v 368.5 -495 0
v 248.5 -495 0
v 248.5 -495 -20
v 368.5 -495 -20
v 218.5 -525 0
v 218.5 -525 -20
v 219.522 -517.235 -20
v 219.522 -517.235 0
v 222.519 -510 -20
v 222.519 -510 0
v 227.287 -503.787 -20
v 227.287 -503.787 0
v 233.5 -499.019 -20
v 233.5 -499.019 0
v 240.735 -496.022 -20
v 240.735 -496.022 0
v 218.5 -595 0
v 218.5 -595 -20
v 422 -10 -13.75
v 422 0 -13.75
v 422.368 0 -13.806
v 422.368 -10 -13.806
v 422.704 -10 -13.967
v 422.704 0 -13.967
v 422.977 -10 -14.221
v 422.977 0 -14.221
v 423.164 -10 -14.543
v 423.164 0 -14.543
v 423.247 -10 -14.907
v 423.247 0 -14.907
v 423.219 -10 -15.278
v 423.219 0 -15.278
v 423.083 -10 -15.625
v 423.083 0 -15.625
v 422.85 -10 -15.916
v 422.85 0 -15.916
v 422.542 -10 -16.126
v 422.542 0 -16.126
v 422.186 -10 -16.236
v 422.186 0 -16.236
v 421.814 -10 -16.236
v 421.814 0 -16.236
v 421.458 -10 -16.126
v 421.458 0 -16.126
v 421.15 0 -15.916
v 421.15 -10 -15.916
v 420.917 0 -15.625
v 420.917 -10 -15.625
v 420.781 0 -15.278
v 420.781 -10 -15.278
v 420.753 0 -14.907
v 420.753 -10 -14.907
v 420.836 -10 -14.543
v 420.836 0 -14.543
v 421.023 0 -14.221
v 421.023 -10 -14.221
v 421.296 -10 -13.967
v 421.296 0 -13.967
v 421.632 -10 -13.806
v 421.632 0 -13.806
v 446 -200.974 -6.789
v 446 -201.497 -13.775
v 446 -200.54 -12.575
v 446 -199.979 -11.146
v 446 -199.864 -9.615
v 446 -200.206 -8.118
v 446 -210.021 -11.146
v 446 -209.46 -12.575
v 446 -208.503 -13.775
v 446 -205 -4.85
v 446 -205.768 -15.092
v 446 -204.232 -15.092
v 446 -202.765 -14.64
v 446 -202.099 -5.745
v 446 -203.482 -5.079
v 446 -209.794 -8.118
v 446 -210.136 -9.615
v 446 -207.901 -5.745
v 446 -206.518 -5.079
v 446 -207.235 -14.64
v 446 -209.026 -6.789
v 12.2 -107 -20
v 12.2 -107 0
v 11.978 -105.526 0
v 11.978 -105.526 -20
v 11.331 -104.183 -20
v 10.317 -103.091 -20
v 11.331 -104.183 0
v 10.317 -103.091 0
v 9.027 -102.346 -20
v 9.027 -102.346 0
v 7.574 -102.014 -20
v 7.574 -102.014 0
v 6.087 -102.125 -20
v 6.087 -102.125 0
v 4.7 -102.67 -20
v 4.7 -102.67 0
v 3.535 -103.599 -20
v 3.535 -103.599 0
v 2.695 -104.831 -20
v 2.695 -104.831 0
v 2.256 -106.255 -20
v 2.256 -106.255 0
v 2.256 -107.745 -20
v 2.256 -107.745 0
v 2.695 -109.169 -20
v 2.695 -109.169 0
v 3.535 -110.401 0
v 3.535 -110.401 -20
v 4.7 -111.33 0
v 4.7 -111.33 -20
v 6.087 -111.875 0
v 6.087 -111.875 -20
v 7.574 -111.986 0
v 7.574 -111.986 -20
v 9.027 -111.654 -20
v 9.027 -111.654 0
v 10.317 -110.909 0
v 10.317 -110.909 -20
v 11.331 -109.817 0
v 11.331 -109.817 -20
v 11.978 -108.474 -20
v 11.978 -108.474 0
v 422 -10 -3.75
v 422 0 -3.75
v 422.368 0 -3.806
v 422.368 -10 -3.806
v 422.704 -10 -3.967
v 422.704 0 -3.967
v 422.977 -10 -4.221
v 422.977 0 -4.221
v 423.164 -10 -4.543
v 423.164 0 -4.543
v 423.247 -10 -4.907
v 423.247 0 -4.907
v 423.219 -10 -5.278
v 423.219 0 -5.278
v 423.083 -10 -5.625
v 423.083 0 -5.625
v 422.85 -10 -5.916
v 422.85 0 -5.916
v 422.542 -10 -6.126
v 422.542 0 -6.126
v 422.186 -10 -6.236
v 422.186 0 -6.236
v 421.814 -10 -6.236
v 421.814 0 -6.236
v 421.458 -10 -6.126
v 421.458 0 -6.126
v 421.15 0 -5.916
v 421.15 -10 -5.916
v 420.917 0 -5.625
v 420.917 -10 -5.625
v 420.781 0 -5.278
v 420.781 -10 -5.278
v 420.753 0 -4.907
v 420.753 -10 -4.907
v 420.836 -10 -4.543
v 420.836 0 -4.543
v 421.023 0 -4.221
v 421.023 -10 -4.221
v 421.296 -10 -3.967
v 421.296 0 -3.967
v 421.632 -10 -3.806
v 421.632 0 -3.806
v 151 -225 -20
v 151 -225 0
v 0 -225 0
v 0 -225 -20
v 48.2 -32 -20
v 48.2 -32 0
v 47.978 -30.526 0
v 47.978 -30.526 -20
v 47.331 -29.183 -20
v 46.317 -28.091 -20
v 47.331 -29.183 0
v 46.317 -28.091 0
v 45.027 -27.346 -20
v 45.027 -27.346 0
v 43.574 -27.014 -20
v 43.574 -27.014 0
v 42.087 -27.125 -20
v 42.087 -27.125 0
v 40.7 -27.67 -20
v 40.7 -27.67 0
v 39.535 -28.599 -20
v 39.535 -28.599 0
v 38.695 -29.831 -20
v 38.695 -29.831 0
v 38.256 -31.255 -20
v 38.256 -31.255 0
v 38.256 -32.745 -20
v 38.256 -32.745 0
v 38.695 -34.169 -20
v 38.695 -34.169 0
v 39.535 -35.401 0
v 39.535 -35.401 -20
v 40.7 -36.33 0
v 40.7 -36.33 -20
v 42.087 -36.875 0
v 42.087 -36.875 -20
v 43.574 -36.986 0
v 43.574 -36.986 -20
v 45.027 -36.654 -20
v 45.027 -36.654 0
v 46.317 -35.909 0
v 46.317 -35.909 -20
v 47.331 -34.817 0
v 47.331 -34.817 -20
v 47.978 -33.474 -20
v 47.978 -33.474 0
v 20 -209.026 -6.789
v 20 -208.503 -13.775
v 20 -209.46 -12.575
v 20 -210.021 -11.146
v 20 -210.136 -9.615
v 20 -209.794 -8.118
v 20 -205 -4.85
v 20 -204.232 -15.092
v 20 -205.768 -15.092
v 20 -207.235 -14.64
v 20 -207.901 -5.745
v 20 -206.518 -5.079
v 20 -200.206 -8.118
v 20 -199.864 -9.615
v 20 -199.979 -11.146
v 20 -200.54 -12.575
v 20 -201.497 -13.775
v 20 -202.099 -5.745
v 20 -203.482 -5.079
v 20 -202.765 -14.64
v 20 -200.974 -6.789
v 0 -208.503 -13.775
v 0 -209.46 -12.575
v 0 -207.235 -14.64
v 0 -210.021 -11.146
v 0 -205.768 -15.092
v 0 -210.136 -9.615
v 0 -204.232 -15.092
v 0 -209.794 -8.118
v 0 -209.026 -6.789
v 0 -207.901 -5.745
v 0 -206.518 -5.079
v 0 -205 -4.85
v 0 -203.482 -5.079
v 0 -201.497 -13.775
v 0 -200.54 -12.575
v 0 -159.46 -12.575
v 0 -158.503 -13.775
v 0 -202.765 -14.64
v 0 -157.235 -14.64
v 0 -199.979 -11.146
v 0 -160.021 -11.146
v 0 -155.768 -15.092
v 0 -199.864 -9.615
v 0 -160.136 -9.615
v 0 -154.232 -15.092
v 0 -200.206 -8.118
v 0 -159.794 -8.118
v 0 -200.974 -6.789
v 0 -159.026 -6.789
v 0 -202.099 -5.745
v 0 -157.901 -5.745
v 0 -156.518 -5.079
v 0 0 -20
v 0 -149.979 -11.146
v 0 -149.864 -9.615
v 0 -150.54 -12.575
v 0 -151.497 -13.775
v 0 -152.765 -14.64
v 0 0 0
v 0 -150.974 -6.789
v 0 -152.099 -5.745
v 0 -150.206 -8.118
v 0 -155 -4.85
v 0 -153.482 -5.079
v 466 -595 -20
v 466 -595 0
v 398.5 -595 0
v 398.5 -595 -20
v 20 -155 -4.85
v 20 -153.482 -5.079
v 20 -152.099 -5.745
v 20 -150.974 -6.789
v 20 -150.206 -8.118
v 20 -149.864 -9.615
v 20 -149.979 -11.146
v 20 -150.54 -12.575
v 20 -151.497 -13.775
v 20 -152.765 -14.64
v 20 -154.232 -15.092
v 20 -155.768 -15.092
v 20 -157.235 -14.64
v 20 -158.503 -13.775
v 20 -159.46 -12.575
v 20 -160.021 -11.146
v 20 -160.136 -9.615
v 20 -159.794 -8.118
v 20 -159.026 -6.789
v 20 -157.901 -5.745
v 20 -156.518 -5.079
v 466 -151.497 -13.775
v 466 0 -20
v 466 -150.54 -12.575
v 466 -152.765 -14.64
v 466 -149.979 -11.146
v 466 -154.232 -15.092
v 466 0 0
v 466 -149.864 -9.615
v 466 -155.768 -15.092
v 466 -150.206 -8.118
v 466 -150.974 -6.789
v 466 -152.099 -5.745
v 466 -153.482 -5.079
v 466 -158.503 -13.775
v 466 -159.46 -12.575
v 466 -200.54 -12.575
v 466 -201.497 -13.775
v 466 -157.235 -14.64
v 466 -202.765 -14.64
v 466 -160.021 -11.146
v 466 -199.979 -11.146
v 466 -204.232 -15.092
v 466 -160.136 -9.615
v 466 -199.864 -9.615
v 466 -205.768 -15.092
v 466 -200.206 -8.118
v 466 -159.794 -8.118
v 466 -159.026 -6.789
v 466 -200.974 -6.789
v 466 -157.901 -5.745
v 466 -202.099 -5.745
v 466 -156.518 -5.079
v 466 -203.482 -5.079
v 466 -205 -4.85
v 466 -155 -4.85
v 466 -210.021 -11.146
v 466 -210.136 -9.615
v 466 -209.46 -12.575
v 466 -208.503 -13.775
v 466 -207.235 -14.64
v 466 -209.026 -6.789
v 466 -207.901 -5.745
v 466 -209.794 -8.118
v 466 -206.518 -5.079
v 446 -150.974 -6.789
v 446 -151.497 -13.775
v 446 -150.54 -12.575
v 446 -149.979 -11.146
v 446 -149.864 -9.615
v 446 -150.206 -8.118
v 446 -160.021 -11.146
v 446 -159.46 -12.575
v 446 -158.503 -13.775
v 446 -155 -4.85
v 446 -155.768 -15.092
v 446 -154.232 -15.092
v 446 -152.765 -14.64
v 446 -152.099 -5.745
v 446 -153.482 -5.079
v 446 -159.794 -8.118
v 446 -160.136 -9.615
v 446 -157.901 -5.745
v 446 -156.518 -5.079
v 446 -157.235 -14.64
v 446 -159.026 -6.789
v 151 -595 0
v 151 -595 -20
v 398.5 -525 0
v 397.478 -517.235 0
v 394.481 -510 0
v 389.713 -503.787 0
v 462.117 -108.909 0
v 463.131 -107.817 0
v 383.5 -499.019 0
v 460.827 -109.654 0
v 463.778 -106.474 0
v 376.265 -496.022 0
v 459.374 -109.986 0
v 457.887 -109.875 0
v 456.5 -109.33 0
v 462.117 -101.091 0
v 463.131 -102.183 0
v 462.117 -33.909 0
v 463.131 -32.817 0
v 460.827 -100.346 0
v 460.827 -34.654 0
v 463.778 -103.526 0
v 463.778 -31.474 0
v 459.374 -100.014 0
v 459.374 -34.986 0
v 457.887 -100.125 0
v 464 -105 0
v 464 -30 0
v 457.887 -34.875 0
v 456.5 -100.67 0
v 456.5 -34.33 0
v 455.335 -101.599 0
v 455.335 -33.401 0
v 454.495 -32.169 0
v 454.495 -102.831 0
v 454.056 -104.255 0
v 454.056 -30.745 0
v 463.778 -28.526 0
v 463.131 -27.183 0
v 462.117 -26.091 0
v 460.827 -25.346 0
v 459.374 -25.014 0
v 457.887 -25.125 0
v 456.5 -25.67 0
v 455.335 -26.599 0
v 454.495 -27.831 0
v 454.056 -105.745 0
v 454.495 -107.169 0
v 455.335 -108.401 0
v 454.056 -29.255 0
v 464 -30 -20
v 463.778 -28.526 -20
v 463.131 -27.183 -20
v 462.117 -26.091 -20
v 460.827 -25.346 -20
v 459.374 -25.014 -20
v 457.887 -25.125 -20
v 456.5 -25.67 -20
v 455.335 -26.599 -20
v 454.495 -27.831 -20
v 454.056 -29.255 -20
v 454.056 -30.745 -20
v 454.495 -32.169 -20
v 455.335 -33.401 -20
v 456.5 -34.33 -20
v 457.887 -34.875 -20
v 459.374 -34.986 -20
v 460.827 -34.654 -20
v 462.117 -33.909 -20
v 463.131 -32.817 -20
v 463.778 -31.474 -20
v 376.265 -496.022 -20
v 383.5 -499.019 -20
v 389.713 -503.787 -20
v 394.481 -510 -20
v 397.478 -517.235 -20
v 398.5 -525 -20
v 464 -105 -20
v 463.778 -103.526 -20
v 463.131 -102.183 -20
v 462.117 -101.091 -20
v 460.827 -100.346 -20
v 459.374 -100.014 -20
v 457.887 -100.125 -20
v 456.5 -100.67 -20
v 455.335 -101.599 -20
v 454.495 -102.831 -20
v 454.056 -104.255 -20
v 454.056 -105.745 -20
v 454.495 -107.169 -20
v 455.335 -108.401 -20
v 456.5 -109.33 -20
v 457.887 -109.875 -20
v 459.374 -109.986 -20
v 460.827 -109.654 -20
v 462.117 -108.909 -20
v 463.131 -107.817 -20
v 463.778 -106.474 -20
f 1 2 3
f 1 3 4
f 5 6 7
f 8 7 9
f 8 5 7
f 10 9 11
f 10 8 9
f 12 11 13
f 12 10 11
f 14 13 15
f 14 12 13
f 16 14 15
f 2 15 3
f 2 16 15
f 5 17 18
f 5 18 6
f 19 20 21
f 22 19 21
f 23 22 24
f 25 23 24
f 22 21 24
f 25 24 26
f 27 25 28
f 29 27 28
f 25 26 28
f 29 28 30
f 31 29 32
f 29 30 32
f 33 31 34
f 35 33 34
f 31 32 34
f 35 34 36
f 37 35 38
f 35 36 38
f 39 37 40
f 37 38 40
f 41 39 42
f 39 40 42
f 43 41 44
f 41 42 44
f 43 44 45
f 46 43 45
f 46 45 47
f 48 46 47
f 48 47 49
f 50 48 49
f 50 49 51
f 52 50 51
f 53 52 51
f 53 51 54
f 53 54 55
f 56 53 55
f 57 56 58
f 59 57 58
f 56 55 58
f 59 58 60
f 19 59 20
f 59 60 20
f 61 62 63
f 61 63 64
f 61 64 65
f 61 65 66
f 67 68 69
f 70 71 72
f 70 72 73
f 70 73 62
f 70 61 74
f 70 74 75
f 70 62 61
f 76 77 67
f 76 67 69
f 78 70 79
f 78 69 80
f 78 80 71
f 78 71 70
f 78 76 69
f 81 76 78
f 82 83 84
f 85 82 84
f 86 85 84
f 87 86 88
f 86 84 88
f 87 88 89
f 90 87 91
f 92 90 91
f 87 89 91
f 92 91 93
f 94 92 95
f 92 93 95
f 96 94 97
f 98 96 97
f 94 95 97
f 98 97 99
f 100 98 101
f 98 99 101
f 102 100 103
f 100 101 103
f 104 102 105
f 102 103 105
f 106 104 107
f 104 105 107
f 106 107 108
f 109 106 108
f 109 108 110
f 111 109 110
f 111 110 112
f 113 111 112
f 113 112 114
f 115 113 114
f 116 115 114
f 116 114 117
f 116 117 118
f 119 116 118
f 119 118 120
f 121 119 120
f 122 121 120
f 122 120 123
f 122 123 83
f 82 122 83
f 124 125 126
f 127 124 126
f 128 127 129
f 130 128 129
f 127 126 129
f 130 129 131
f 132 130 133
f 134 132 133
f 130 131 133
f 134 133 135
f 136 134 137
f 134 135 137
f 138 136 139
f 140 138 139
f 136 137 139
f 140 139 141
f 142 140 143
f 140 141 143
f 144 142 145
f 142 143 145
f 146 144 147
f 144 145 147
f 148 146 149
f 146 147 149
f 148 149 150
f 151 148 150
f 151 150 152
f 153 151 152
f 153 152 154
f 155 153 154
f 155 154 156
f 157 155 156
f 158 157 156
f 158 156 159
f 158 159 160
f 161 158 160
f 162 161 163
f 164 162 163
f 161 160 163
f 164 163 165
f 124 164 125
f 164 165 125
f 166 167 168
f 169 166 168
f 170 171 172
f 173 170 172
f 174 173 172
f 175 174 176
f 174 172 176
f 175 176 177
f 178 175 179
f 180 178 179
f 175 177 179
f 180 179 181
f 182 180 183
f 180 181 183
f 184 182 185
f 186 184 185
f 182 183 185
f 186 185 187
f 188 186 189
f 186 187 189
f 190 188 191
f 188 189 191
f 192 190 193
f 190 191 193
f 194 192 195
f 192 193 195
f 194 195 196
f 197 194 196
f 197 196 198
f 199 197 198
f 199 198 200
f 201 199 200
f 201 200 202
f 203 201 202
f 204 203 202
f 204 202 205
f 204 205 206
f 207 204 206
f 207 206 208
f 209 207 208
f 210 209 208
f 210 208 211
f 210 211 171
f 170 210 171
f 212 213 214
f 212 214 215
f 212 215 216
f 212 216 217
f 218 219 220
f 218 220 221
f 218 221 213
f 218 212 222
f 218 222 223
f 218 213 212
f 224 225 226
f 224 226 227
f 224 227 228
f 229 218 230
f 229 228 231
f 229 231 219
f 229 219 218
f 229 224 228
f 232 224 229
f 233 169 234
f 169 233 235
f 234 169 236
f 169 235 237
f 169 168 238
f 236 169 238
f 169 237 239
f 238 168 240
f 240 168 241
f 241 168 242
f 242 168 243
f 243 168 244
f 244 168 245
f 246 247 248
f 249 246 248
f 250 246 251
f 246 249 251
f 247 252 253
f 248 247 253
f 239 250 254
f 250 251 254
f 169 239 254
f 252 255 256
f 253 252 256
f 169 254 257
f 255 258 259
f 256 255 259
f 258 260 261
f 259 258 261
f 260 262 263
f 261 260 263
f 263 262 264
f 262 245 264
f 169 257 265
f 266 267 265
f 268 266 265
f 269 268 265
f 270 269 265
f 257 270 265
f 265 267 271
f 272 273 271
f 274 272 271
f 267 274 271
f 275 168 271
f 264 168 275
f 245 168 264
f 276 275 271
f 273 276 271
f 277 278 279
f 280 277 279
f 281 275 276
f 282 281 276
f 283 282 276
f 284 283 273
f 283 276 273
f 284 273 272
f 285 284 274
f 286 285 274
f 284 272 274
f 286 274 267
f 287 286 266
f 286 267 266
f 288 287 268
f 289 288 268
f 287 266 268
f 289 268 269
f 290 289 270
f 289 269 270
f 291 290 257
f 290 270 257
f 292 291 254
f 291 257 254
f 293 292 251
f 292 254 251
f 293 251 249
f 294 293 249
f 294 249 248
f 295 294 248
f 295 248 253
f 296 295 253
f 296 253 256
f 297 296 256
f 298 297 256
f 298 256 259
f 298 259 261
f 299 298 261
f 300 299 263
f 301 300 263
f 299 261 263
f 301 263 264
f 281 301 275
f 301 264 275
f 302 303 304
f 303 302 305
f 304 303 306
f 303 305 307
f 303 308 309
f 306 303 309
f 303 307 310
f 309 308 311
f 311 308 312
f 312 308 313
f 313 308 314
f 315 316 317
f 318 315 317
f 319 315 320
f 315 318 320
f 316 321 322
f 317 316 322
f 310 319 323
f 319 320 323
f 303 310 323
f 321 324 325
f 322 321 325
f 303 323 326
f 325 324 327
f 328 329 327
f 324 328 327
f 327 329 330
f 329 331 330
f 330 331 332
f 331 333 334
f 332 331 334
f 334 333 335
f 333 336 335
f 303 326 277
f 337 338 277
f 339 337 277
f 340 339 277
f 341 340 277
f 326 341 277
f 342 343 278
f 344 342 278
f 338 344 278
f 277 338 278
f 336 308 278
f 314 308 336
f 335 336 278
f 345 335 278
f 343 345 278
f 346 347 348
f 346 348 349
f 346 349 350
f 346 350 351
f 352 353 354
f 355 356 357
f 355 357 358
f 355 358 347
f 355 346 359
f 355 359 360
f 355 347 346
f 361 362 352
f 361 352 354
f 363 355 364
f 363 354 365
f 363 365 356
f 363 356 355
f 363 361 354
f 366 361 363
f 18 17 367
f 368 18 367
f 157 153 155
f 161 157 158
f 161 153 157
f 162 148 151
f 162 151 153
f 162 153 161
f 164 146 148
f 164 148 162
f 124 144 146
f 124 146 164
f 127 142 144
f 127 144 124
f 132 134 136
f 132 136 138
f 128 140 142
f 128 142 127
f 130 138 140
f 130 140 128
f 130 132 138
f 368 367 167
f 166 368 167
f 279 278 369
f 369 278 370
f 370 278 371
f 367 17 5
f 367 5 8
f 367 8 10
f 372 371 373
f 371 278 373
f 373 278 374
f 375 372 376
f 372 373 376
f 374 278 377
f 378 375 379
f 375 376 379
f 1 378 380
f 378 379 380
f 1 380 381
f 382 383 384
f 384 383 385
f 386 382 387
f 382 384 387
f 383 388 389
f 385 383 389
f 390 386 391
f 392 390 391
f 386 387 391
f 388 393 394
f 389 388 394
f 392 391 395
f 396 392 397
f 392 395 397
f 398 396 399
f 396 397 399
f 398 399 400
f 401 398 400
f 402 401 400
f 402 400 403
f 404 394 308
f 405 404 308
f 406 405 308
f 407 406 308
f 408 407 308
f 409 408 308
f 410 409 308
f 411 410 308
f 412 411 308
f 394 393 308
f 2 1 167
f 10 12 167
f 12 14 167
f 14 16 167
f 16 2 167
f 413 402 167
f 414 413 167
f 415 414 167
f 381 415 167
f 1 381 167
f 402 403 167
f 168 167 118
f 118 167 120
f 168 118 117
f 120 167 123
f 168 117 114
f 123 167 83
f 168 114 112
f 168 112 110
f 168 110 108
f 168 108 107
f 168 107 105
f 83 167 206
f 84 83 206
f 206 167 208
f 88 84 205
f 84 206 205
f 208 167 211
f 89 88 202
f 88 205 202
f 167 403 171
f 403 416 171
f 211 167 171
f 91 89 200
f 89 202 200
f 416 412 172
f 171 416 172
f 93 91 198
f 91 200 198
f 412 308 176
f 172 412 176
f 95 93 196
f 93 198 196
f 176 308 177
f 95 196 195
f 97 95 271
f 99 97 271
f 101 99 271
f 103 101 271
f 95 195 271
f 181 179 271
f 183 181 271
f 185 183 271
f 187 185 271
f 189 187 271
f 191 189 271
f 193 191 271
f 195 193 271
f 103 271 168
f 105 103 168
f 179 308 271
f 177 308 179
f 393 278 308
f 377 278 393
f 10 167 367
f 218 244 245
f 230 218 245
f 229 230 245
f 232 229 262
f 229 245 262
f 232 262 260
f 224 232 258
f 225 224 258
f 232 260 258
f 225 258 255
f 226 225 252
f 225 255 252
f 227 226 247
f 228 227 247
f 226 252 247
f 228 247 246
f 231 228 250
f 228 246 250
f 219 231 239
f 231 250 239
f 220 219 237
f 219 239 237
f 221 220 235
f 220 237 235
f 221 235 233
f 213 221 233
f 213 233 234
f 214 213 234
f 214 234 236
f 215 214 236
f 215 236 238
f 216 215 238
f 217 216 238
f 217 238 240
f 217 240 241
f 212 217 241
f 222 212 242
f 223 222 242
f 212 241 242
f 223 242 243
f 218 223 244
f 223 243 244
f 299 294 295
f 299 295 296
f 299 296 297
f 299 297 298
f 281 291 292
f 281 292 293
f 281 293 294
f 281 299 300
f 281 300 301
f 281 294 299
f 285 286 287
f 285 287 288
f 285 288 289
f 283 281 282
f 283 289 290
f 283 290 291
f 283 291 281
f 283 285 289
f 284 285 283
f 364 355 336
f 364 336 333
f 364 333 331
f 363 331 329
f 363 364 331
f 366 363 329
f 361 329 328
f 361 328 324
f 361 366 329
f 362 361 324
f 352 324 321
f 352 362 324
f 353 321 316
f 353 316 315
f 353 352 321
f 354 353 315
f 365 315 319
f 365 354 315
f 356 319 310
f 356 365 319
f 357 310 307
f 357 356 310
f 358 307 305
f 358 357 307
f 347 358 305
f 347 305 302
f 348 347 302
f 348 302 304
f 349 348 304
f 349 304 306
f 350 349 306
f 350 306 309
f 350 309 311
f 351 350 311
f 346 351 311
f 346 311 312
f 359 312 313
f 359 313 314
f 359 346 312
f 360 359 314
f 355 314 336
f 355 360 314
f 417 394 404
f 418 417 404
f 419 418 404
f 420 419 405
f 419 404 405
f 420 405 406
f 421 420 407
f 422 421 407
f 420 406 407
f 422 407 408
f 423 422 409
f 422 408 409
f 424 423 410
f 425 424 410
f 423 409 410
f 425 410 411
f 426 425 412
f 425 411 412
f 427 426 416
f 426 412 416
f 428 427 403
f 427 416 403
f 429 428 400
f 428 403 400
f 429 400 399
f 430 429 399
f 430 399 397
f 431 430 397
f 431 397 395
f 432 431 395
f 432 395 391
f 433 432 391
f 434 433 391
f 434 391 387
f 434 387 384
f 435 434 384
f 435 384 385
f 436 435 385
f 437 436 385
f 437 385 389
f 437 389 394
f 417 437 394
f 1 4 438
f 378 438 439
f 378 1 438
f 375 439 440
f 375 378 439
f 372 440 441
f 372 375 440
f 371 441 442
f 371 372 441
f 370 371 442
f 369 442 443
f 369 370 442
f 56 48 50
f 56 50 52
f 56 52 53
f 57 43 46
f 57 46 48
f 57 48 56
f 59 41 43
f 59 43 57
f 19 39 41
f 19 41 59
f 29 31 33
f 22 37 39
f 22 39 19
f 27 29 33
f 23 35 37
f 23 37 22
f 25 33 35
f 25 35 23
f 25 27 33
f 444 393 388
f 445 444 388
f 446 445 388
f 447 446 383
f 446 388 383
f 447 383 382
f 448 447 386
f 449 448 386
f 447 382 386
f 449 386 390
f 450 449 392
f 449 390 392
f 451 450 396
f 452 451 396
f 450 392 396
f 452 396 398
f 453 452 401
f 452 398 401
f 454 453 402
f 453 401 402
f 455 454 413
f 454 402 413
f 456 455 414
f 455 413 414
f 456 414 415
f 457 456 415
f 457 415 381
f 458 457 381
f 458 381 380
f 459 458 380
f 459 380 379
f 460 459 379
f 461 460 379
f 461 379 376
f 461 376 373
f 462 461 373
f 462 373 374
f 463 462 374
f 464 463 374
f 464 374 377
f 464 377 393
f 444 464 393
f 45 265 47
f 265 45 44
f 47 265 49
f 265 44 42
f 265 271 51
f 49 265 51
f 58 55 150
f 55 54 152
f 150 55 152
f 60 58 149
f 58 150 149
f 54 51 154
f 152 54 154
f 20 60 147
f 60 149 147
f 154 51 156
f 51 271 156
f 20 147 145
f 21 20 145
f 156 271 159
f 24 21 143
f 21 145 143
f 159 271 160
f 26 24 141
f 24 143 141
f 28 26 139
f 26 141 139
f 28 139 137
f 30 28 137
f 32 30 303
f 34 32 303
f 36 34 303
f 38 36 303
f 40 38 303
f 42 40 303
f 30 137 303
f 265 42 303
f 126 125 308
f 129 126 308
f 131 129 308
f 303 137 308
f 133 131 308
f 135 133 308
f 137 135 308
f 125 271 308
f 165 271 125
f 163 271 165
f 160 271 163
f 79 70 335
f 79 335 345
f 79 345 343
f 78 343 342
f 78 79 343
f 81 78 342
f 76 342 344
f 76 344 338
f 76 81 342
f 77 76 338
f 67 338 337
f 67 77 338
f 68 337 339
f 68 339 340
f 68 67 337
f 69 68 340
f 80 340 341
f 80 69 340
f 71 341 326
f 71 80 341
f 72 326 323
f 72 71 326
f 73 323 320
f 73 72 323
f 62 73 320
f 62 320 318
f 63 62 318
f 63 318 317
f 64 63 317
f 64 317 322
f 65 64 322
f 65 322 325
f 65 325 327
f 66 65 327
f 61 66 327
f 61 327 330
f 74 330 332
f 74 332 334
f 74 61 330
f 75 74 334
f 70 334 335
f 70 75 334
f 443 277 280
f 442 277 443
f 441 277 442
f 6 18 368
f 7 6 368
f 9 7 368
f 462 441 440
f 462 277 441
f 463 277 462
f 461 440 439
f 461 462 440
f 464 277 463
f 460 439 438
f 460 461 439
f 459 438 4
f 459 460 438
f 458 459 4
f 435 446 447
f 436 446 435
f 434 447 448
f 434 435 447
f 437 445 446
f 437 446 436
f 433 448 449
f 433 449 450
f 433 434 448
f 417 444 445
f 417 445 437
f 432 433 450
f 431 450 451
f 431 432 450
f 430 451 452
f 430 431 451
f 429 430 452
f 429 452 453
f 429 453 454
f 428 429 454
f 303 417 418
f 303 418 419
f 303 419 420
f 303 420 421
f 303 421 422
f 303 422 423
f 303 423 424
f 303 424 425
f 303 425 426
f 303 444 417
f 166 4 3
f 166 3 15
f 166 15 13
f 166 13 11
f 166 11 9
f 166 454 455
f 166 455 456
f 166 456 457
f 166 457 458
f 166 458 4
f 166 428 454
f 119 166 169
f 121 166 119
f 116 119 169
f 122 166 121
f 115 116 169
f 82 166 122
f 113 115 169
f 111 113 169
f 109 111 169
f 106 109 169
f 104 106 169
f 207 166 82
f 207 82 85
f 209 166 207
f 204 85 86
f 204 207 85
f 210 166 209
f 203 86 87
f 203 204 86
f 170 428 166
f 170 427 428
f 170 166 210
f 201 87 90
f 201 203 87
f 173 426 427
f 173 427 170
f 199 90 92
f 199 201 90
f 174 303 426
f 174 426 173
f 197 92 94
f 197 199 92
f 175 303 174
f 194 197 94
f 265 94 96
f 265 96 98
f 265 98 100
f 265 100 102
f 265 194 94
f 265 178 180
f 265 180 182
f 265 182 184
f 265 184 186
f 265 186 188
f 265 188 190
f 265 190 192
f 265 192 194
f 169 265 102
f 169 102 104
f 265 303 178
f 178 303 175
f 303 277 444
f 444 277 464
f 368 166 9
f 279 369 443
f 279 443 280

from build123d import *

# Parameters (mm, degrees)
EXTRUDE_1_DEPTH     = 20
SKETCH_2_R          = 5
CUT_EXTRUDE_1_DEPTH = 757.029761319
SKETCH_3_R          = 5.15
CUT_EXTRUDE_2_DEPTH = 20
CUT_EXTRUDE_START   = -20
SKETCH_4_R          = 5.15
CUT_EXTRUDE_3_DEPTH = 20
SKETCH_5_R          = 1.25
CUT_EXTRUDE_4_DEPTH = 10


with BuildPart() as part:
    # 草图1 → 凸台-拉伸1 (new body)
    with BuildSketch(Plane.XY):
        Polygon((0, 0), (466, 0), (466, -595), (151, -595), (151, -225), (0, -225), align=None)
    extrude(amount=-EXTRUDE_1_DEPTH)

    # 草图2 → 切除-拉伸1 (cut, through all)
    with BuildSketch(Plane.XY):
        with Locations((43.2, -32)):
            Circle(SKETCH_2_R)
        with Locations((459, -30)):
            Circle(SKETCH_2_R)
        with Locations((459, -105)):
            Circle(SKETCH_2_R)
        with Locations((7.2, -107)):
            Circle(SKETCH_2_R)
        with BuildLine():
            Line((218.5, -595), (218.5, -525))
            ThreePointArc((218.5, -525), (227.286796564, -503.786796564), (248.5, -495))
            Line((248.5, -495), (368.5, -495))
            ThreePointArc((368.5, -495), (389.713203436, -503.786796564), (398.5, -525))
            Line((398.5, -525), (398.5, -595))
            Line((398.5, -595), (218.5, -595))
        make_face()
    extrude(amount=-CUT_EXTRUDE_1_DEPTH, mode=Mode.SUBTRACT)

    # 草图3 → 切除-拉伸2 (cut)
    with BuildSketch(Plane.ZY):
        with Locations((-10, -155)):
            Circle(SKETCH_3_R)
        with Locations((-10, -205)):
            Circle(SKETCH_3_R)
    extrude(amount=-CUT_EXTRUDE_2_DEPTH, mode=Mode.SUBTRACT)

    # 草图4 → 切除-拉伸3 (cut)
    with BuildSketch(Plane(origin=(466, 0, 0), x_dir=(0, 0, -1), z_dir=(1, 0, 0)).offset(CUT_EXTRUDE_START)):
        with Locations(Location((10, -155, 0), (0, 0, 180))):
            Circle(SKETCH_4_R)
        with Locations(Location((10, -205, 0), (0, 0, 180))):
            Circle(SKETCH_4_R)
    extrude(amount=CUT_EXTRUDE_3_DEPTH, mode=Mode.SUBTRACT)

    # 草图5 → 切除-拉伸4 (cut)
    with BuildSketch(Plane(origin=(0, 0, 0), x_dir=(1, 0, 0), z_dir=(0, 1, 0))):
        with Locations(Location((422, 15, 0), (0, 0, 270))):
            Circle(SKETCH_5_R)
        with Locations(Location((422, 5, 0), (0, 0, 270))):
            Circle(SKETCH_5_R)
    extrude(amount=-CUT_EXTRUDE_4_DEPTH, mode=Mode.SUBTRACT)


solid = part.part
